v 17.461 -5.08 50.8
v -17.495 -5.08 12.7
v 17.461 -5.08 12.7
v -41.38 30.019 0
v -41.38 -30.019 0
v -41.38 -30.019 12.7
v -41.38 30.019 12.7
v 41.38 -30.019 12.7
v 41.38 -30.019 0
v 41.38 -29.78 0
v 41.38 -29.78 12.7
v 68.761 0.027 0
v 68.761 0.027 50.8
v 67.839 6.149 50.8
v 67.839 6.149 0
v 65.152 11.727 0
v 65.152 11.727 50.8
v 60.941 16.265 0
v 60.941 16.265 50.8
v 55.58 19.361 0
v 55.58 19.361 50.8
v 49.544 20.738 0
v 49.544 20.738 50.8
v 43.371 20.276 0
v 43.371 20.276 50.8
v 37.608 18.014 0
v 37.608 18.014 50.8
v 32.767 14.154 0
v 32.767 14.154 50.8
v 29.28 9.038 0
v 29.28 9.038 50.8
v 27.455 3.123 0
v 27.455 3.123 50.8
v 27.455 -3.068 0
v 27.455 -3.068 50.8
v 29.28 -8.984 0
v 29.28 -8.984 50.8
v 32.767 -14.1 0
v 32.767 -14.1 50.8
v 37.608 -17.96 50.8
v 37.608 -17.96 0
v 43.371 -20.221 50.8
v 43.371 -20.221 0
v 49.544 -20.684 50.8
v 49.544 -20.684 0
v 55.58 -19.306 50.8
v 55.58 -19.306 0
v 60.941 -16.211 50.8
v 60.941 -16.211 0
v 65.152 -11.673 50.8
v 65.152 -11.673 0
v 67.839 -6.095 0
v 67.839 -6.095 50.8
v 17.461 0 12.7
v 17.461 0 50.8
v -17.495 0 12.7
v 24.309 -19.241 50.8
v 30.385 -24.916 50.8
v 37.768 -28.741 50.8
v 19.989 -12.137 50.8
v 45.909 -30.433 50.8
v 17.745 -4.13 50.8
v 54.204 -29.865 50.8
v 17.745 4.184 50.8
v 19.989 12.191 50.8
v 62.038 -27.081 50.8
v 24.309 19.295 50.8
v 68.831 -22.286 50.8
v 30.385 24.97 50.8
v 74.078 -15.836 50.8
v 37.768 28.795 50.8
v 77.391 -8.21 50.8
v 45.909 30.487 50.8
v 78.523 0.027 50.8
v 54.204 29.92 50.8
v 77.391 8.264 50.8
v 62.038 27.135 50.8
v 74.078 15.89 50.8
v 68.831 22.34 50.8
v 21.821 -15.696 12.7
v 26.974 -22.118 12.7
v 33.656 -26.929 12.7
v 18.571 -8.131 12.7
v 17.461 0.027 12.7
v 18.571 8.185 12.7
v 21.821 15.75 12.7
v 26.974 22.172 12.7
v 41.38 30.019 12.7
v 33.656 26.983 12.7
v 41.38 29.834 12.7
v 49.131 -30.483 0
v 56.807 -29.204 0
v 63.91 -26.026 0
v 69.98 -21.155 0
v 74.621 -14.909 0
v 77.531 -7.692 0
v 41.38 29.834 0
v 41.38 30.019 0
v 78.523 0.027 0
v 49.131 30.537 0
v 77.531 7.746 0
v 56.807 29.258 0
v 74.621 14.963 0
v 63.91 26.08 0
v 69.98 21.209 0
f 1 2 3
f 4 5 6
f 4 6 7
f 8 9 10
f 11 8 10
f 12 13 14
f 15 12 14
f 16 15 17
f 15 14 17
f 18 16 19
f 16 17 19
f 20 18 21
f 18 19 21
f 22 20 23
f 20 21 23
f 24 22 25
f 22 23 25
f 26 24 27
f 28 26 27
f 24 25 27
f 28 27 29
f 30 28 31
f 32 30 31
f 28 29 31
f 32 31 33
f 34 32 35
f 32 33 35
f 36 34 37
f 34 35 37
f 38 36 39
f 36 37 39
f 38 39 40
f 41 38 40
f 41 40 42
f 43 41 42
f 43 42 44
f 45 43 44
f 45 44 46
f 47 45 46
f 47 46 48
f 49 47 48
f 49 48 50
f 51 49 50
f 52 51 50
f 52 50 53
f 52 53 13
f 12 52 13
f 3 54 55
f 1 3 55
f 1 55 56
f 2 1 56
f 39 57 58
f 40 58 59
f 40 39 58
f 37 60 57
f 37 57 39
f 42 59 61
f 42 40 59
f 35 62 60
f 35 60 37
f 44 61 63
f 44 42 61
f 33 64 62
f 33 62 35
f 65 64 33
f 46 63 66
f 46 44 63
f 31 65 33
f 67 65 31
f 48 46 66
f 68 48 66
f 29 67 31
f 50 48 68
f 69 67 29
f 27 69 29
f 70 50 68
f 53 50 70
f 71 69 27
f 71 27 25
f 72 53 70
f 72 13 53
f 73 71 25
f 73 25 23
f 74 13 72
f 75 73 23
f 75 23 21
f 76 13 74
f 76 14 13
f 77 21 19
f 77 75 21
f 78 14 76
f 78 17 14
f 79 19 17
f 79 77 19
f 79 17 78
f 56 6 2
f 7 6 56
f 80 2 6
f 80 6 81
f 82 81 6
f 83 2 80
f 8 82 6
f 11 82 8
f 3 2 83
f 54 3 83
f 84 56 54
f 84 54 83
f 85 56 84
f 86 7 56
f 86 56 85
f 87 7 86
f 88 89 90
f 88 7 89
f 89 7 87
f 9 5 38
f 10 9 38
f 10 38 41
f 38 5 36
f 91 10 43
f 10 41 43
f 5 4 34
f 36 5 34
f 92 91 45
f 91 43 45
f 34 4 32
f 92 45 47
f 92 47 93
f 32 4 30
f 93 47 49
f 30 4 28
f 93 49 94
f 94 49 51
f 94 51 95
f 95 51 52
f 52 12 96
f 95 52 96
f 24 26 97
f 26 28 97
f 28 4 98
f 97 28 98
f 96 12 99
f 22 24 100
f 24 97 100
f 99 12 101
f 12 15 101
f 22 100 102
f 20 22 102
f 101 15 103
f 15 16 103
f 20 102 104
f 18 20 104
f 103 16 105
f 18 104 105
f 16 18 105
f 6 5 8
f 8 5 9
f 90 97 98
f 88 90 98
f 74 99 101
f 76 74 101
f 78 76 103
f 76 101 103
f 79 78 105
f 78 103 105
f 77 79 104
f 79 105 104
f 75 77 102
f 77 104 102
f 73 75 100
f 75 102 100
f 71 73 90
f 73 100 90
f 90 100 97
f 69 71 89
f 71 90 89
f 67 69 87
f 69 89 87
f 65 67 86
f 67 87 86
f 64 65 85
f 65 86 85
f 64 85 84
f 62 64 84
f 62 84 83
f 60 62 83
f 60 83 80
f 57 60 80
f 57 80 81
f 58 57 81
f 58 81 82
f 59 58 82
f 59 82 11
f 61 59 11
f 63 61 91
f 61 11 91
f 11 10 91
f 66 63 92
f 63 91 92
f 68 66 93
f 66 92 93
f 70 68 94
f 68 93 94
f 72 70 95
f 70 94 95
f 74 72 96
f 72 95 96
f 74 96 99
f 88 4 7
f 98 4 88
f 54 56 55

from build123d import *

# Parameters (mm, degrees)
F0_W     = 82.760722
F0_H     = 60.0374
F1_DEPTH = 12.7
F2_R     = 30.531053
F3_DEPTH = 50.8
F5_DEPTH = 5.08
F6_R     = 20.769196
F7_DEPTH = 50.801


with BuildPart() as f1:
    # F0 (on Top) → F1 (new body)
    with BuildSketch(Plane.XY):
        Rectangle(F0_W, F0_H)
    extrude(amount=F1_DEPTH)

    # F2 (on Top) → F3 (join)
    with BuildSketch(Plane.XY):
        with Locations((47.992117, 0.027034)):
            Circle(F2_R)
    extrude(amount=F3_DEPTH)

    # F4 (on Front) → F5 (join)
    with BuildSketch(Plane.XZ):
        Polygon((-17.495457, 12.7), (17.461064, 12.7), (17.461064, 50.8), align=None)
    extrude(amount=F5_DEPTH)

    # F6 (on face) → F7 (cut, through all)
    with BuildSketch(Plane.XY.offset(50.8)):
        with Locations((47.992117, 0.027034)):
            Circle(F6_R)
    extrude(amount=-F7_DEPTH, mode=Mode.SUBTRACT)


solid = f1.part
